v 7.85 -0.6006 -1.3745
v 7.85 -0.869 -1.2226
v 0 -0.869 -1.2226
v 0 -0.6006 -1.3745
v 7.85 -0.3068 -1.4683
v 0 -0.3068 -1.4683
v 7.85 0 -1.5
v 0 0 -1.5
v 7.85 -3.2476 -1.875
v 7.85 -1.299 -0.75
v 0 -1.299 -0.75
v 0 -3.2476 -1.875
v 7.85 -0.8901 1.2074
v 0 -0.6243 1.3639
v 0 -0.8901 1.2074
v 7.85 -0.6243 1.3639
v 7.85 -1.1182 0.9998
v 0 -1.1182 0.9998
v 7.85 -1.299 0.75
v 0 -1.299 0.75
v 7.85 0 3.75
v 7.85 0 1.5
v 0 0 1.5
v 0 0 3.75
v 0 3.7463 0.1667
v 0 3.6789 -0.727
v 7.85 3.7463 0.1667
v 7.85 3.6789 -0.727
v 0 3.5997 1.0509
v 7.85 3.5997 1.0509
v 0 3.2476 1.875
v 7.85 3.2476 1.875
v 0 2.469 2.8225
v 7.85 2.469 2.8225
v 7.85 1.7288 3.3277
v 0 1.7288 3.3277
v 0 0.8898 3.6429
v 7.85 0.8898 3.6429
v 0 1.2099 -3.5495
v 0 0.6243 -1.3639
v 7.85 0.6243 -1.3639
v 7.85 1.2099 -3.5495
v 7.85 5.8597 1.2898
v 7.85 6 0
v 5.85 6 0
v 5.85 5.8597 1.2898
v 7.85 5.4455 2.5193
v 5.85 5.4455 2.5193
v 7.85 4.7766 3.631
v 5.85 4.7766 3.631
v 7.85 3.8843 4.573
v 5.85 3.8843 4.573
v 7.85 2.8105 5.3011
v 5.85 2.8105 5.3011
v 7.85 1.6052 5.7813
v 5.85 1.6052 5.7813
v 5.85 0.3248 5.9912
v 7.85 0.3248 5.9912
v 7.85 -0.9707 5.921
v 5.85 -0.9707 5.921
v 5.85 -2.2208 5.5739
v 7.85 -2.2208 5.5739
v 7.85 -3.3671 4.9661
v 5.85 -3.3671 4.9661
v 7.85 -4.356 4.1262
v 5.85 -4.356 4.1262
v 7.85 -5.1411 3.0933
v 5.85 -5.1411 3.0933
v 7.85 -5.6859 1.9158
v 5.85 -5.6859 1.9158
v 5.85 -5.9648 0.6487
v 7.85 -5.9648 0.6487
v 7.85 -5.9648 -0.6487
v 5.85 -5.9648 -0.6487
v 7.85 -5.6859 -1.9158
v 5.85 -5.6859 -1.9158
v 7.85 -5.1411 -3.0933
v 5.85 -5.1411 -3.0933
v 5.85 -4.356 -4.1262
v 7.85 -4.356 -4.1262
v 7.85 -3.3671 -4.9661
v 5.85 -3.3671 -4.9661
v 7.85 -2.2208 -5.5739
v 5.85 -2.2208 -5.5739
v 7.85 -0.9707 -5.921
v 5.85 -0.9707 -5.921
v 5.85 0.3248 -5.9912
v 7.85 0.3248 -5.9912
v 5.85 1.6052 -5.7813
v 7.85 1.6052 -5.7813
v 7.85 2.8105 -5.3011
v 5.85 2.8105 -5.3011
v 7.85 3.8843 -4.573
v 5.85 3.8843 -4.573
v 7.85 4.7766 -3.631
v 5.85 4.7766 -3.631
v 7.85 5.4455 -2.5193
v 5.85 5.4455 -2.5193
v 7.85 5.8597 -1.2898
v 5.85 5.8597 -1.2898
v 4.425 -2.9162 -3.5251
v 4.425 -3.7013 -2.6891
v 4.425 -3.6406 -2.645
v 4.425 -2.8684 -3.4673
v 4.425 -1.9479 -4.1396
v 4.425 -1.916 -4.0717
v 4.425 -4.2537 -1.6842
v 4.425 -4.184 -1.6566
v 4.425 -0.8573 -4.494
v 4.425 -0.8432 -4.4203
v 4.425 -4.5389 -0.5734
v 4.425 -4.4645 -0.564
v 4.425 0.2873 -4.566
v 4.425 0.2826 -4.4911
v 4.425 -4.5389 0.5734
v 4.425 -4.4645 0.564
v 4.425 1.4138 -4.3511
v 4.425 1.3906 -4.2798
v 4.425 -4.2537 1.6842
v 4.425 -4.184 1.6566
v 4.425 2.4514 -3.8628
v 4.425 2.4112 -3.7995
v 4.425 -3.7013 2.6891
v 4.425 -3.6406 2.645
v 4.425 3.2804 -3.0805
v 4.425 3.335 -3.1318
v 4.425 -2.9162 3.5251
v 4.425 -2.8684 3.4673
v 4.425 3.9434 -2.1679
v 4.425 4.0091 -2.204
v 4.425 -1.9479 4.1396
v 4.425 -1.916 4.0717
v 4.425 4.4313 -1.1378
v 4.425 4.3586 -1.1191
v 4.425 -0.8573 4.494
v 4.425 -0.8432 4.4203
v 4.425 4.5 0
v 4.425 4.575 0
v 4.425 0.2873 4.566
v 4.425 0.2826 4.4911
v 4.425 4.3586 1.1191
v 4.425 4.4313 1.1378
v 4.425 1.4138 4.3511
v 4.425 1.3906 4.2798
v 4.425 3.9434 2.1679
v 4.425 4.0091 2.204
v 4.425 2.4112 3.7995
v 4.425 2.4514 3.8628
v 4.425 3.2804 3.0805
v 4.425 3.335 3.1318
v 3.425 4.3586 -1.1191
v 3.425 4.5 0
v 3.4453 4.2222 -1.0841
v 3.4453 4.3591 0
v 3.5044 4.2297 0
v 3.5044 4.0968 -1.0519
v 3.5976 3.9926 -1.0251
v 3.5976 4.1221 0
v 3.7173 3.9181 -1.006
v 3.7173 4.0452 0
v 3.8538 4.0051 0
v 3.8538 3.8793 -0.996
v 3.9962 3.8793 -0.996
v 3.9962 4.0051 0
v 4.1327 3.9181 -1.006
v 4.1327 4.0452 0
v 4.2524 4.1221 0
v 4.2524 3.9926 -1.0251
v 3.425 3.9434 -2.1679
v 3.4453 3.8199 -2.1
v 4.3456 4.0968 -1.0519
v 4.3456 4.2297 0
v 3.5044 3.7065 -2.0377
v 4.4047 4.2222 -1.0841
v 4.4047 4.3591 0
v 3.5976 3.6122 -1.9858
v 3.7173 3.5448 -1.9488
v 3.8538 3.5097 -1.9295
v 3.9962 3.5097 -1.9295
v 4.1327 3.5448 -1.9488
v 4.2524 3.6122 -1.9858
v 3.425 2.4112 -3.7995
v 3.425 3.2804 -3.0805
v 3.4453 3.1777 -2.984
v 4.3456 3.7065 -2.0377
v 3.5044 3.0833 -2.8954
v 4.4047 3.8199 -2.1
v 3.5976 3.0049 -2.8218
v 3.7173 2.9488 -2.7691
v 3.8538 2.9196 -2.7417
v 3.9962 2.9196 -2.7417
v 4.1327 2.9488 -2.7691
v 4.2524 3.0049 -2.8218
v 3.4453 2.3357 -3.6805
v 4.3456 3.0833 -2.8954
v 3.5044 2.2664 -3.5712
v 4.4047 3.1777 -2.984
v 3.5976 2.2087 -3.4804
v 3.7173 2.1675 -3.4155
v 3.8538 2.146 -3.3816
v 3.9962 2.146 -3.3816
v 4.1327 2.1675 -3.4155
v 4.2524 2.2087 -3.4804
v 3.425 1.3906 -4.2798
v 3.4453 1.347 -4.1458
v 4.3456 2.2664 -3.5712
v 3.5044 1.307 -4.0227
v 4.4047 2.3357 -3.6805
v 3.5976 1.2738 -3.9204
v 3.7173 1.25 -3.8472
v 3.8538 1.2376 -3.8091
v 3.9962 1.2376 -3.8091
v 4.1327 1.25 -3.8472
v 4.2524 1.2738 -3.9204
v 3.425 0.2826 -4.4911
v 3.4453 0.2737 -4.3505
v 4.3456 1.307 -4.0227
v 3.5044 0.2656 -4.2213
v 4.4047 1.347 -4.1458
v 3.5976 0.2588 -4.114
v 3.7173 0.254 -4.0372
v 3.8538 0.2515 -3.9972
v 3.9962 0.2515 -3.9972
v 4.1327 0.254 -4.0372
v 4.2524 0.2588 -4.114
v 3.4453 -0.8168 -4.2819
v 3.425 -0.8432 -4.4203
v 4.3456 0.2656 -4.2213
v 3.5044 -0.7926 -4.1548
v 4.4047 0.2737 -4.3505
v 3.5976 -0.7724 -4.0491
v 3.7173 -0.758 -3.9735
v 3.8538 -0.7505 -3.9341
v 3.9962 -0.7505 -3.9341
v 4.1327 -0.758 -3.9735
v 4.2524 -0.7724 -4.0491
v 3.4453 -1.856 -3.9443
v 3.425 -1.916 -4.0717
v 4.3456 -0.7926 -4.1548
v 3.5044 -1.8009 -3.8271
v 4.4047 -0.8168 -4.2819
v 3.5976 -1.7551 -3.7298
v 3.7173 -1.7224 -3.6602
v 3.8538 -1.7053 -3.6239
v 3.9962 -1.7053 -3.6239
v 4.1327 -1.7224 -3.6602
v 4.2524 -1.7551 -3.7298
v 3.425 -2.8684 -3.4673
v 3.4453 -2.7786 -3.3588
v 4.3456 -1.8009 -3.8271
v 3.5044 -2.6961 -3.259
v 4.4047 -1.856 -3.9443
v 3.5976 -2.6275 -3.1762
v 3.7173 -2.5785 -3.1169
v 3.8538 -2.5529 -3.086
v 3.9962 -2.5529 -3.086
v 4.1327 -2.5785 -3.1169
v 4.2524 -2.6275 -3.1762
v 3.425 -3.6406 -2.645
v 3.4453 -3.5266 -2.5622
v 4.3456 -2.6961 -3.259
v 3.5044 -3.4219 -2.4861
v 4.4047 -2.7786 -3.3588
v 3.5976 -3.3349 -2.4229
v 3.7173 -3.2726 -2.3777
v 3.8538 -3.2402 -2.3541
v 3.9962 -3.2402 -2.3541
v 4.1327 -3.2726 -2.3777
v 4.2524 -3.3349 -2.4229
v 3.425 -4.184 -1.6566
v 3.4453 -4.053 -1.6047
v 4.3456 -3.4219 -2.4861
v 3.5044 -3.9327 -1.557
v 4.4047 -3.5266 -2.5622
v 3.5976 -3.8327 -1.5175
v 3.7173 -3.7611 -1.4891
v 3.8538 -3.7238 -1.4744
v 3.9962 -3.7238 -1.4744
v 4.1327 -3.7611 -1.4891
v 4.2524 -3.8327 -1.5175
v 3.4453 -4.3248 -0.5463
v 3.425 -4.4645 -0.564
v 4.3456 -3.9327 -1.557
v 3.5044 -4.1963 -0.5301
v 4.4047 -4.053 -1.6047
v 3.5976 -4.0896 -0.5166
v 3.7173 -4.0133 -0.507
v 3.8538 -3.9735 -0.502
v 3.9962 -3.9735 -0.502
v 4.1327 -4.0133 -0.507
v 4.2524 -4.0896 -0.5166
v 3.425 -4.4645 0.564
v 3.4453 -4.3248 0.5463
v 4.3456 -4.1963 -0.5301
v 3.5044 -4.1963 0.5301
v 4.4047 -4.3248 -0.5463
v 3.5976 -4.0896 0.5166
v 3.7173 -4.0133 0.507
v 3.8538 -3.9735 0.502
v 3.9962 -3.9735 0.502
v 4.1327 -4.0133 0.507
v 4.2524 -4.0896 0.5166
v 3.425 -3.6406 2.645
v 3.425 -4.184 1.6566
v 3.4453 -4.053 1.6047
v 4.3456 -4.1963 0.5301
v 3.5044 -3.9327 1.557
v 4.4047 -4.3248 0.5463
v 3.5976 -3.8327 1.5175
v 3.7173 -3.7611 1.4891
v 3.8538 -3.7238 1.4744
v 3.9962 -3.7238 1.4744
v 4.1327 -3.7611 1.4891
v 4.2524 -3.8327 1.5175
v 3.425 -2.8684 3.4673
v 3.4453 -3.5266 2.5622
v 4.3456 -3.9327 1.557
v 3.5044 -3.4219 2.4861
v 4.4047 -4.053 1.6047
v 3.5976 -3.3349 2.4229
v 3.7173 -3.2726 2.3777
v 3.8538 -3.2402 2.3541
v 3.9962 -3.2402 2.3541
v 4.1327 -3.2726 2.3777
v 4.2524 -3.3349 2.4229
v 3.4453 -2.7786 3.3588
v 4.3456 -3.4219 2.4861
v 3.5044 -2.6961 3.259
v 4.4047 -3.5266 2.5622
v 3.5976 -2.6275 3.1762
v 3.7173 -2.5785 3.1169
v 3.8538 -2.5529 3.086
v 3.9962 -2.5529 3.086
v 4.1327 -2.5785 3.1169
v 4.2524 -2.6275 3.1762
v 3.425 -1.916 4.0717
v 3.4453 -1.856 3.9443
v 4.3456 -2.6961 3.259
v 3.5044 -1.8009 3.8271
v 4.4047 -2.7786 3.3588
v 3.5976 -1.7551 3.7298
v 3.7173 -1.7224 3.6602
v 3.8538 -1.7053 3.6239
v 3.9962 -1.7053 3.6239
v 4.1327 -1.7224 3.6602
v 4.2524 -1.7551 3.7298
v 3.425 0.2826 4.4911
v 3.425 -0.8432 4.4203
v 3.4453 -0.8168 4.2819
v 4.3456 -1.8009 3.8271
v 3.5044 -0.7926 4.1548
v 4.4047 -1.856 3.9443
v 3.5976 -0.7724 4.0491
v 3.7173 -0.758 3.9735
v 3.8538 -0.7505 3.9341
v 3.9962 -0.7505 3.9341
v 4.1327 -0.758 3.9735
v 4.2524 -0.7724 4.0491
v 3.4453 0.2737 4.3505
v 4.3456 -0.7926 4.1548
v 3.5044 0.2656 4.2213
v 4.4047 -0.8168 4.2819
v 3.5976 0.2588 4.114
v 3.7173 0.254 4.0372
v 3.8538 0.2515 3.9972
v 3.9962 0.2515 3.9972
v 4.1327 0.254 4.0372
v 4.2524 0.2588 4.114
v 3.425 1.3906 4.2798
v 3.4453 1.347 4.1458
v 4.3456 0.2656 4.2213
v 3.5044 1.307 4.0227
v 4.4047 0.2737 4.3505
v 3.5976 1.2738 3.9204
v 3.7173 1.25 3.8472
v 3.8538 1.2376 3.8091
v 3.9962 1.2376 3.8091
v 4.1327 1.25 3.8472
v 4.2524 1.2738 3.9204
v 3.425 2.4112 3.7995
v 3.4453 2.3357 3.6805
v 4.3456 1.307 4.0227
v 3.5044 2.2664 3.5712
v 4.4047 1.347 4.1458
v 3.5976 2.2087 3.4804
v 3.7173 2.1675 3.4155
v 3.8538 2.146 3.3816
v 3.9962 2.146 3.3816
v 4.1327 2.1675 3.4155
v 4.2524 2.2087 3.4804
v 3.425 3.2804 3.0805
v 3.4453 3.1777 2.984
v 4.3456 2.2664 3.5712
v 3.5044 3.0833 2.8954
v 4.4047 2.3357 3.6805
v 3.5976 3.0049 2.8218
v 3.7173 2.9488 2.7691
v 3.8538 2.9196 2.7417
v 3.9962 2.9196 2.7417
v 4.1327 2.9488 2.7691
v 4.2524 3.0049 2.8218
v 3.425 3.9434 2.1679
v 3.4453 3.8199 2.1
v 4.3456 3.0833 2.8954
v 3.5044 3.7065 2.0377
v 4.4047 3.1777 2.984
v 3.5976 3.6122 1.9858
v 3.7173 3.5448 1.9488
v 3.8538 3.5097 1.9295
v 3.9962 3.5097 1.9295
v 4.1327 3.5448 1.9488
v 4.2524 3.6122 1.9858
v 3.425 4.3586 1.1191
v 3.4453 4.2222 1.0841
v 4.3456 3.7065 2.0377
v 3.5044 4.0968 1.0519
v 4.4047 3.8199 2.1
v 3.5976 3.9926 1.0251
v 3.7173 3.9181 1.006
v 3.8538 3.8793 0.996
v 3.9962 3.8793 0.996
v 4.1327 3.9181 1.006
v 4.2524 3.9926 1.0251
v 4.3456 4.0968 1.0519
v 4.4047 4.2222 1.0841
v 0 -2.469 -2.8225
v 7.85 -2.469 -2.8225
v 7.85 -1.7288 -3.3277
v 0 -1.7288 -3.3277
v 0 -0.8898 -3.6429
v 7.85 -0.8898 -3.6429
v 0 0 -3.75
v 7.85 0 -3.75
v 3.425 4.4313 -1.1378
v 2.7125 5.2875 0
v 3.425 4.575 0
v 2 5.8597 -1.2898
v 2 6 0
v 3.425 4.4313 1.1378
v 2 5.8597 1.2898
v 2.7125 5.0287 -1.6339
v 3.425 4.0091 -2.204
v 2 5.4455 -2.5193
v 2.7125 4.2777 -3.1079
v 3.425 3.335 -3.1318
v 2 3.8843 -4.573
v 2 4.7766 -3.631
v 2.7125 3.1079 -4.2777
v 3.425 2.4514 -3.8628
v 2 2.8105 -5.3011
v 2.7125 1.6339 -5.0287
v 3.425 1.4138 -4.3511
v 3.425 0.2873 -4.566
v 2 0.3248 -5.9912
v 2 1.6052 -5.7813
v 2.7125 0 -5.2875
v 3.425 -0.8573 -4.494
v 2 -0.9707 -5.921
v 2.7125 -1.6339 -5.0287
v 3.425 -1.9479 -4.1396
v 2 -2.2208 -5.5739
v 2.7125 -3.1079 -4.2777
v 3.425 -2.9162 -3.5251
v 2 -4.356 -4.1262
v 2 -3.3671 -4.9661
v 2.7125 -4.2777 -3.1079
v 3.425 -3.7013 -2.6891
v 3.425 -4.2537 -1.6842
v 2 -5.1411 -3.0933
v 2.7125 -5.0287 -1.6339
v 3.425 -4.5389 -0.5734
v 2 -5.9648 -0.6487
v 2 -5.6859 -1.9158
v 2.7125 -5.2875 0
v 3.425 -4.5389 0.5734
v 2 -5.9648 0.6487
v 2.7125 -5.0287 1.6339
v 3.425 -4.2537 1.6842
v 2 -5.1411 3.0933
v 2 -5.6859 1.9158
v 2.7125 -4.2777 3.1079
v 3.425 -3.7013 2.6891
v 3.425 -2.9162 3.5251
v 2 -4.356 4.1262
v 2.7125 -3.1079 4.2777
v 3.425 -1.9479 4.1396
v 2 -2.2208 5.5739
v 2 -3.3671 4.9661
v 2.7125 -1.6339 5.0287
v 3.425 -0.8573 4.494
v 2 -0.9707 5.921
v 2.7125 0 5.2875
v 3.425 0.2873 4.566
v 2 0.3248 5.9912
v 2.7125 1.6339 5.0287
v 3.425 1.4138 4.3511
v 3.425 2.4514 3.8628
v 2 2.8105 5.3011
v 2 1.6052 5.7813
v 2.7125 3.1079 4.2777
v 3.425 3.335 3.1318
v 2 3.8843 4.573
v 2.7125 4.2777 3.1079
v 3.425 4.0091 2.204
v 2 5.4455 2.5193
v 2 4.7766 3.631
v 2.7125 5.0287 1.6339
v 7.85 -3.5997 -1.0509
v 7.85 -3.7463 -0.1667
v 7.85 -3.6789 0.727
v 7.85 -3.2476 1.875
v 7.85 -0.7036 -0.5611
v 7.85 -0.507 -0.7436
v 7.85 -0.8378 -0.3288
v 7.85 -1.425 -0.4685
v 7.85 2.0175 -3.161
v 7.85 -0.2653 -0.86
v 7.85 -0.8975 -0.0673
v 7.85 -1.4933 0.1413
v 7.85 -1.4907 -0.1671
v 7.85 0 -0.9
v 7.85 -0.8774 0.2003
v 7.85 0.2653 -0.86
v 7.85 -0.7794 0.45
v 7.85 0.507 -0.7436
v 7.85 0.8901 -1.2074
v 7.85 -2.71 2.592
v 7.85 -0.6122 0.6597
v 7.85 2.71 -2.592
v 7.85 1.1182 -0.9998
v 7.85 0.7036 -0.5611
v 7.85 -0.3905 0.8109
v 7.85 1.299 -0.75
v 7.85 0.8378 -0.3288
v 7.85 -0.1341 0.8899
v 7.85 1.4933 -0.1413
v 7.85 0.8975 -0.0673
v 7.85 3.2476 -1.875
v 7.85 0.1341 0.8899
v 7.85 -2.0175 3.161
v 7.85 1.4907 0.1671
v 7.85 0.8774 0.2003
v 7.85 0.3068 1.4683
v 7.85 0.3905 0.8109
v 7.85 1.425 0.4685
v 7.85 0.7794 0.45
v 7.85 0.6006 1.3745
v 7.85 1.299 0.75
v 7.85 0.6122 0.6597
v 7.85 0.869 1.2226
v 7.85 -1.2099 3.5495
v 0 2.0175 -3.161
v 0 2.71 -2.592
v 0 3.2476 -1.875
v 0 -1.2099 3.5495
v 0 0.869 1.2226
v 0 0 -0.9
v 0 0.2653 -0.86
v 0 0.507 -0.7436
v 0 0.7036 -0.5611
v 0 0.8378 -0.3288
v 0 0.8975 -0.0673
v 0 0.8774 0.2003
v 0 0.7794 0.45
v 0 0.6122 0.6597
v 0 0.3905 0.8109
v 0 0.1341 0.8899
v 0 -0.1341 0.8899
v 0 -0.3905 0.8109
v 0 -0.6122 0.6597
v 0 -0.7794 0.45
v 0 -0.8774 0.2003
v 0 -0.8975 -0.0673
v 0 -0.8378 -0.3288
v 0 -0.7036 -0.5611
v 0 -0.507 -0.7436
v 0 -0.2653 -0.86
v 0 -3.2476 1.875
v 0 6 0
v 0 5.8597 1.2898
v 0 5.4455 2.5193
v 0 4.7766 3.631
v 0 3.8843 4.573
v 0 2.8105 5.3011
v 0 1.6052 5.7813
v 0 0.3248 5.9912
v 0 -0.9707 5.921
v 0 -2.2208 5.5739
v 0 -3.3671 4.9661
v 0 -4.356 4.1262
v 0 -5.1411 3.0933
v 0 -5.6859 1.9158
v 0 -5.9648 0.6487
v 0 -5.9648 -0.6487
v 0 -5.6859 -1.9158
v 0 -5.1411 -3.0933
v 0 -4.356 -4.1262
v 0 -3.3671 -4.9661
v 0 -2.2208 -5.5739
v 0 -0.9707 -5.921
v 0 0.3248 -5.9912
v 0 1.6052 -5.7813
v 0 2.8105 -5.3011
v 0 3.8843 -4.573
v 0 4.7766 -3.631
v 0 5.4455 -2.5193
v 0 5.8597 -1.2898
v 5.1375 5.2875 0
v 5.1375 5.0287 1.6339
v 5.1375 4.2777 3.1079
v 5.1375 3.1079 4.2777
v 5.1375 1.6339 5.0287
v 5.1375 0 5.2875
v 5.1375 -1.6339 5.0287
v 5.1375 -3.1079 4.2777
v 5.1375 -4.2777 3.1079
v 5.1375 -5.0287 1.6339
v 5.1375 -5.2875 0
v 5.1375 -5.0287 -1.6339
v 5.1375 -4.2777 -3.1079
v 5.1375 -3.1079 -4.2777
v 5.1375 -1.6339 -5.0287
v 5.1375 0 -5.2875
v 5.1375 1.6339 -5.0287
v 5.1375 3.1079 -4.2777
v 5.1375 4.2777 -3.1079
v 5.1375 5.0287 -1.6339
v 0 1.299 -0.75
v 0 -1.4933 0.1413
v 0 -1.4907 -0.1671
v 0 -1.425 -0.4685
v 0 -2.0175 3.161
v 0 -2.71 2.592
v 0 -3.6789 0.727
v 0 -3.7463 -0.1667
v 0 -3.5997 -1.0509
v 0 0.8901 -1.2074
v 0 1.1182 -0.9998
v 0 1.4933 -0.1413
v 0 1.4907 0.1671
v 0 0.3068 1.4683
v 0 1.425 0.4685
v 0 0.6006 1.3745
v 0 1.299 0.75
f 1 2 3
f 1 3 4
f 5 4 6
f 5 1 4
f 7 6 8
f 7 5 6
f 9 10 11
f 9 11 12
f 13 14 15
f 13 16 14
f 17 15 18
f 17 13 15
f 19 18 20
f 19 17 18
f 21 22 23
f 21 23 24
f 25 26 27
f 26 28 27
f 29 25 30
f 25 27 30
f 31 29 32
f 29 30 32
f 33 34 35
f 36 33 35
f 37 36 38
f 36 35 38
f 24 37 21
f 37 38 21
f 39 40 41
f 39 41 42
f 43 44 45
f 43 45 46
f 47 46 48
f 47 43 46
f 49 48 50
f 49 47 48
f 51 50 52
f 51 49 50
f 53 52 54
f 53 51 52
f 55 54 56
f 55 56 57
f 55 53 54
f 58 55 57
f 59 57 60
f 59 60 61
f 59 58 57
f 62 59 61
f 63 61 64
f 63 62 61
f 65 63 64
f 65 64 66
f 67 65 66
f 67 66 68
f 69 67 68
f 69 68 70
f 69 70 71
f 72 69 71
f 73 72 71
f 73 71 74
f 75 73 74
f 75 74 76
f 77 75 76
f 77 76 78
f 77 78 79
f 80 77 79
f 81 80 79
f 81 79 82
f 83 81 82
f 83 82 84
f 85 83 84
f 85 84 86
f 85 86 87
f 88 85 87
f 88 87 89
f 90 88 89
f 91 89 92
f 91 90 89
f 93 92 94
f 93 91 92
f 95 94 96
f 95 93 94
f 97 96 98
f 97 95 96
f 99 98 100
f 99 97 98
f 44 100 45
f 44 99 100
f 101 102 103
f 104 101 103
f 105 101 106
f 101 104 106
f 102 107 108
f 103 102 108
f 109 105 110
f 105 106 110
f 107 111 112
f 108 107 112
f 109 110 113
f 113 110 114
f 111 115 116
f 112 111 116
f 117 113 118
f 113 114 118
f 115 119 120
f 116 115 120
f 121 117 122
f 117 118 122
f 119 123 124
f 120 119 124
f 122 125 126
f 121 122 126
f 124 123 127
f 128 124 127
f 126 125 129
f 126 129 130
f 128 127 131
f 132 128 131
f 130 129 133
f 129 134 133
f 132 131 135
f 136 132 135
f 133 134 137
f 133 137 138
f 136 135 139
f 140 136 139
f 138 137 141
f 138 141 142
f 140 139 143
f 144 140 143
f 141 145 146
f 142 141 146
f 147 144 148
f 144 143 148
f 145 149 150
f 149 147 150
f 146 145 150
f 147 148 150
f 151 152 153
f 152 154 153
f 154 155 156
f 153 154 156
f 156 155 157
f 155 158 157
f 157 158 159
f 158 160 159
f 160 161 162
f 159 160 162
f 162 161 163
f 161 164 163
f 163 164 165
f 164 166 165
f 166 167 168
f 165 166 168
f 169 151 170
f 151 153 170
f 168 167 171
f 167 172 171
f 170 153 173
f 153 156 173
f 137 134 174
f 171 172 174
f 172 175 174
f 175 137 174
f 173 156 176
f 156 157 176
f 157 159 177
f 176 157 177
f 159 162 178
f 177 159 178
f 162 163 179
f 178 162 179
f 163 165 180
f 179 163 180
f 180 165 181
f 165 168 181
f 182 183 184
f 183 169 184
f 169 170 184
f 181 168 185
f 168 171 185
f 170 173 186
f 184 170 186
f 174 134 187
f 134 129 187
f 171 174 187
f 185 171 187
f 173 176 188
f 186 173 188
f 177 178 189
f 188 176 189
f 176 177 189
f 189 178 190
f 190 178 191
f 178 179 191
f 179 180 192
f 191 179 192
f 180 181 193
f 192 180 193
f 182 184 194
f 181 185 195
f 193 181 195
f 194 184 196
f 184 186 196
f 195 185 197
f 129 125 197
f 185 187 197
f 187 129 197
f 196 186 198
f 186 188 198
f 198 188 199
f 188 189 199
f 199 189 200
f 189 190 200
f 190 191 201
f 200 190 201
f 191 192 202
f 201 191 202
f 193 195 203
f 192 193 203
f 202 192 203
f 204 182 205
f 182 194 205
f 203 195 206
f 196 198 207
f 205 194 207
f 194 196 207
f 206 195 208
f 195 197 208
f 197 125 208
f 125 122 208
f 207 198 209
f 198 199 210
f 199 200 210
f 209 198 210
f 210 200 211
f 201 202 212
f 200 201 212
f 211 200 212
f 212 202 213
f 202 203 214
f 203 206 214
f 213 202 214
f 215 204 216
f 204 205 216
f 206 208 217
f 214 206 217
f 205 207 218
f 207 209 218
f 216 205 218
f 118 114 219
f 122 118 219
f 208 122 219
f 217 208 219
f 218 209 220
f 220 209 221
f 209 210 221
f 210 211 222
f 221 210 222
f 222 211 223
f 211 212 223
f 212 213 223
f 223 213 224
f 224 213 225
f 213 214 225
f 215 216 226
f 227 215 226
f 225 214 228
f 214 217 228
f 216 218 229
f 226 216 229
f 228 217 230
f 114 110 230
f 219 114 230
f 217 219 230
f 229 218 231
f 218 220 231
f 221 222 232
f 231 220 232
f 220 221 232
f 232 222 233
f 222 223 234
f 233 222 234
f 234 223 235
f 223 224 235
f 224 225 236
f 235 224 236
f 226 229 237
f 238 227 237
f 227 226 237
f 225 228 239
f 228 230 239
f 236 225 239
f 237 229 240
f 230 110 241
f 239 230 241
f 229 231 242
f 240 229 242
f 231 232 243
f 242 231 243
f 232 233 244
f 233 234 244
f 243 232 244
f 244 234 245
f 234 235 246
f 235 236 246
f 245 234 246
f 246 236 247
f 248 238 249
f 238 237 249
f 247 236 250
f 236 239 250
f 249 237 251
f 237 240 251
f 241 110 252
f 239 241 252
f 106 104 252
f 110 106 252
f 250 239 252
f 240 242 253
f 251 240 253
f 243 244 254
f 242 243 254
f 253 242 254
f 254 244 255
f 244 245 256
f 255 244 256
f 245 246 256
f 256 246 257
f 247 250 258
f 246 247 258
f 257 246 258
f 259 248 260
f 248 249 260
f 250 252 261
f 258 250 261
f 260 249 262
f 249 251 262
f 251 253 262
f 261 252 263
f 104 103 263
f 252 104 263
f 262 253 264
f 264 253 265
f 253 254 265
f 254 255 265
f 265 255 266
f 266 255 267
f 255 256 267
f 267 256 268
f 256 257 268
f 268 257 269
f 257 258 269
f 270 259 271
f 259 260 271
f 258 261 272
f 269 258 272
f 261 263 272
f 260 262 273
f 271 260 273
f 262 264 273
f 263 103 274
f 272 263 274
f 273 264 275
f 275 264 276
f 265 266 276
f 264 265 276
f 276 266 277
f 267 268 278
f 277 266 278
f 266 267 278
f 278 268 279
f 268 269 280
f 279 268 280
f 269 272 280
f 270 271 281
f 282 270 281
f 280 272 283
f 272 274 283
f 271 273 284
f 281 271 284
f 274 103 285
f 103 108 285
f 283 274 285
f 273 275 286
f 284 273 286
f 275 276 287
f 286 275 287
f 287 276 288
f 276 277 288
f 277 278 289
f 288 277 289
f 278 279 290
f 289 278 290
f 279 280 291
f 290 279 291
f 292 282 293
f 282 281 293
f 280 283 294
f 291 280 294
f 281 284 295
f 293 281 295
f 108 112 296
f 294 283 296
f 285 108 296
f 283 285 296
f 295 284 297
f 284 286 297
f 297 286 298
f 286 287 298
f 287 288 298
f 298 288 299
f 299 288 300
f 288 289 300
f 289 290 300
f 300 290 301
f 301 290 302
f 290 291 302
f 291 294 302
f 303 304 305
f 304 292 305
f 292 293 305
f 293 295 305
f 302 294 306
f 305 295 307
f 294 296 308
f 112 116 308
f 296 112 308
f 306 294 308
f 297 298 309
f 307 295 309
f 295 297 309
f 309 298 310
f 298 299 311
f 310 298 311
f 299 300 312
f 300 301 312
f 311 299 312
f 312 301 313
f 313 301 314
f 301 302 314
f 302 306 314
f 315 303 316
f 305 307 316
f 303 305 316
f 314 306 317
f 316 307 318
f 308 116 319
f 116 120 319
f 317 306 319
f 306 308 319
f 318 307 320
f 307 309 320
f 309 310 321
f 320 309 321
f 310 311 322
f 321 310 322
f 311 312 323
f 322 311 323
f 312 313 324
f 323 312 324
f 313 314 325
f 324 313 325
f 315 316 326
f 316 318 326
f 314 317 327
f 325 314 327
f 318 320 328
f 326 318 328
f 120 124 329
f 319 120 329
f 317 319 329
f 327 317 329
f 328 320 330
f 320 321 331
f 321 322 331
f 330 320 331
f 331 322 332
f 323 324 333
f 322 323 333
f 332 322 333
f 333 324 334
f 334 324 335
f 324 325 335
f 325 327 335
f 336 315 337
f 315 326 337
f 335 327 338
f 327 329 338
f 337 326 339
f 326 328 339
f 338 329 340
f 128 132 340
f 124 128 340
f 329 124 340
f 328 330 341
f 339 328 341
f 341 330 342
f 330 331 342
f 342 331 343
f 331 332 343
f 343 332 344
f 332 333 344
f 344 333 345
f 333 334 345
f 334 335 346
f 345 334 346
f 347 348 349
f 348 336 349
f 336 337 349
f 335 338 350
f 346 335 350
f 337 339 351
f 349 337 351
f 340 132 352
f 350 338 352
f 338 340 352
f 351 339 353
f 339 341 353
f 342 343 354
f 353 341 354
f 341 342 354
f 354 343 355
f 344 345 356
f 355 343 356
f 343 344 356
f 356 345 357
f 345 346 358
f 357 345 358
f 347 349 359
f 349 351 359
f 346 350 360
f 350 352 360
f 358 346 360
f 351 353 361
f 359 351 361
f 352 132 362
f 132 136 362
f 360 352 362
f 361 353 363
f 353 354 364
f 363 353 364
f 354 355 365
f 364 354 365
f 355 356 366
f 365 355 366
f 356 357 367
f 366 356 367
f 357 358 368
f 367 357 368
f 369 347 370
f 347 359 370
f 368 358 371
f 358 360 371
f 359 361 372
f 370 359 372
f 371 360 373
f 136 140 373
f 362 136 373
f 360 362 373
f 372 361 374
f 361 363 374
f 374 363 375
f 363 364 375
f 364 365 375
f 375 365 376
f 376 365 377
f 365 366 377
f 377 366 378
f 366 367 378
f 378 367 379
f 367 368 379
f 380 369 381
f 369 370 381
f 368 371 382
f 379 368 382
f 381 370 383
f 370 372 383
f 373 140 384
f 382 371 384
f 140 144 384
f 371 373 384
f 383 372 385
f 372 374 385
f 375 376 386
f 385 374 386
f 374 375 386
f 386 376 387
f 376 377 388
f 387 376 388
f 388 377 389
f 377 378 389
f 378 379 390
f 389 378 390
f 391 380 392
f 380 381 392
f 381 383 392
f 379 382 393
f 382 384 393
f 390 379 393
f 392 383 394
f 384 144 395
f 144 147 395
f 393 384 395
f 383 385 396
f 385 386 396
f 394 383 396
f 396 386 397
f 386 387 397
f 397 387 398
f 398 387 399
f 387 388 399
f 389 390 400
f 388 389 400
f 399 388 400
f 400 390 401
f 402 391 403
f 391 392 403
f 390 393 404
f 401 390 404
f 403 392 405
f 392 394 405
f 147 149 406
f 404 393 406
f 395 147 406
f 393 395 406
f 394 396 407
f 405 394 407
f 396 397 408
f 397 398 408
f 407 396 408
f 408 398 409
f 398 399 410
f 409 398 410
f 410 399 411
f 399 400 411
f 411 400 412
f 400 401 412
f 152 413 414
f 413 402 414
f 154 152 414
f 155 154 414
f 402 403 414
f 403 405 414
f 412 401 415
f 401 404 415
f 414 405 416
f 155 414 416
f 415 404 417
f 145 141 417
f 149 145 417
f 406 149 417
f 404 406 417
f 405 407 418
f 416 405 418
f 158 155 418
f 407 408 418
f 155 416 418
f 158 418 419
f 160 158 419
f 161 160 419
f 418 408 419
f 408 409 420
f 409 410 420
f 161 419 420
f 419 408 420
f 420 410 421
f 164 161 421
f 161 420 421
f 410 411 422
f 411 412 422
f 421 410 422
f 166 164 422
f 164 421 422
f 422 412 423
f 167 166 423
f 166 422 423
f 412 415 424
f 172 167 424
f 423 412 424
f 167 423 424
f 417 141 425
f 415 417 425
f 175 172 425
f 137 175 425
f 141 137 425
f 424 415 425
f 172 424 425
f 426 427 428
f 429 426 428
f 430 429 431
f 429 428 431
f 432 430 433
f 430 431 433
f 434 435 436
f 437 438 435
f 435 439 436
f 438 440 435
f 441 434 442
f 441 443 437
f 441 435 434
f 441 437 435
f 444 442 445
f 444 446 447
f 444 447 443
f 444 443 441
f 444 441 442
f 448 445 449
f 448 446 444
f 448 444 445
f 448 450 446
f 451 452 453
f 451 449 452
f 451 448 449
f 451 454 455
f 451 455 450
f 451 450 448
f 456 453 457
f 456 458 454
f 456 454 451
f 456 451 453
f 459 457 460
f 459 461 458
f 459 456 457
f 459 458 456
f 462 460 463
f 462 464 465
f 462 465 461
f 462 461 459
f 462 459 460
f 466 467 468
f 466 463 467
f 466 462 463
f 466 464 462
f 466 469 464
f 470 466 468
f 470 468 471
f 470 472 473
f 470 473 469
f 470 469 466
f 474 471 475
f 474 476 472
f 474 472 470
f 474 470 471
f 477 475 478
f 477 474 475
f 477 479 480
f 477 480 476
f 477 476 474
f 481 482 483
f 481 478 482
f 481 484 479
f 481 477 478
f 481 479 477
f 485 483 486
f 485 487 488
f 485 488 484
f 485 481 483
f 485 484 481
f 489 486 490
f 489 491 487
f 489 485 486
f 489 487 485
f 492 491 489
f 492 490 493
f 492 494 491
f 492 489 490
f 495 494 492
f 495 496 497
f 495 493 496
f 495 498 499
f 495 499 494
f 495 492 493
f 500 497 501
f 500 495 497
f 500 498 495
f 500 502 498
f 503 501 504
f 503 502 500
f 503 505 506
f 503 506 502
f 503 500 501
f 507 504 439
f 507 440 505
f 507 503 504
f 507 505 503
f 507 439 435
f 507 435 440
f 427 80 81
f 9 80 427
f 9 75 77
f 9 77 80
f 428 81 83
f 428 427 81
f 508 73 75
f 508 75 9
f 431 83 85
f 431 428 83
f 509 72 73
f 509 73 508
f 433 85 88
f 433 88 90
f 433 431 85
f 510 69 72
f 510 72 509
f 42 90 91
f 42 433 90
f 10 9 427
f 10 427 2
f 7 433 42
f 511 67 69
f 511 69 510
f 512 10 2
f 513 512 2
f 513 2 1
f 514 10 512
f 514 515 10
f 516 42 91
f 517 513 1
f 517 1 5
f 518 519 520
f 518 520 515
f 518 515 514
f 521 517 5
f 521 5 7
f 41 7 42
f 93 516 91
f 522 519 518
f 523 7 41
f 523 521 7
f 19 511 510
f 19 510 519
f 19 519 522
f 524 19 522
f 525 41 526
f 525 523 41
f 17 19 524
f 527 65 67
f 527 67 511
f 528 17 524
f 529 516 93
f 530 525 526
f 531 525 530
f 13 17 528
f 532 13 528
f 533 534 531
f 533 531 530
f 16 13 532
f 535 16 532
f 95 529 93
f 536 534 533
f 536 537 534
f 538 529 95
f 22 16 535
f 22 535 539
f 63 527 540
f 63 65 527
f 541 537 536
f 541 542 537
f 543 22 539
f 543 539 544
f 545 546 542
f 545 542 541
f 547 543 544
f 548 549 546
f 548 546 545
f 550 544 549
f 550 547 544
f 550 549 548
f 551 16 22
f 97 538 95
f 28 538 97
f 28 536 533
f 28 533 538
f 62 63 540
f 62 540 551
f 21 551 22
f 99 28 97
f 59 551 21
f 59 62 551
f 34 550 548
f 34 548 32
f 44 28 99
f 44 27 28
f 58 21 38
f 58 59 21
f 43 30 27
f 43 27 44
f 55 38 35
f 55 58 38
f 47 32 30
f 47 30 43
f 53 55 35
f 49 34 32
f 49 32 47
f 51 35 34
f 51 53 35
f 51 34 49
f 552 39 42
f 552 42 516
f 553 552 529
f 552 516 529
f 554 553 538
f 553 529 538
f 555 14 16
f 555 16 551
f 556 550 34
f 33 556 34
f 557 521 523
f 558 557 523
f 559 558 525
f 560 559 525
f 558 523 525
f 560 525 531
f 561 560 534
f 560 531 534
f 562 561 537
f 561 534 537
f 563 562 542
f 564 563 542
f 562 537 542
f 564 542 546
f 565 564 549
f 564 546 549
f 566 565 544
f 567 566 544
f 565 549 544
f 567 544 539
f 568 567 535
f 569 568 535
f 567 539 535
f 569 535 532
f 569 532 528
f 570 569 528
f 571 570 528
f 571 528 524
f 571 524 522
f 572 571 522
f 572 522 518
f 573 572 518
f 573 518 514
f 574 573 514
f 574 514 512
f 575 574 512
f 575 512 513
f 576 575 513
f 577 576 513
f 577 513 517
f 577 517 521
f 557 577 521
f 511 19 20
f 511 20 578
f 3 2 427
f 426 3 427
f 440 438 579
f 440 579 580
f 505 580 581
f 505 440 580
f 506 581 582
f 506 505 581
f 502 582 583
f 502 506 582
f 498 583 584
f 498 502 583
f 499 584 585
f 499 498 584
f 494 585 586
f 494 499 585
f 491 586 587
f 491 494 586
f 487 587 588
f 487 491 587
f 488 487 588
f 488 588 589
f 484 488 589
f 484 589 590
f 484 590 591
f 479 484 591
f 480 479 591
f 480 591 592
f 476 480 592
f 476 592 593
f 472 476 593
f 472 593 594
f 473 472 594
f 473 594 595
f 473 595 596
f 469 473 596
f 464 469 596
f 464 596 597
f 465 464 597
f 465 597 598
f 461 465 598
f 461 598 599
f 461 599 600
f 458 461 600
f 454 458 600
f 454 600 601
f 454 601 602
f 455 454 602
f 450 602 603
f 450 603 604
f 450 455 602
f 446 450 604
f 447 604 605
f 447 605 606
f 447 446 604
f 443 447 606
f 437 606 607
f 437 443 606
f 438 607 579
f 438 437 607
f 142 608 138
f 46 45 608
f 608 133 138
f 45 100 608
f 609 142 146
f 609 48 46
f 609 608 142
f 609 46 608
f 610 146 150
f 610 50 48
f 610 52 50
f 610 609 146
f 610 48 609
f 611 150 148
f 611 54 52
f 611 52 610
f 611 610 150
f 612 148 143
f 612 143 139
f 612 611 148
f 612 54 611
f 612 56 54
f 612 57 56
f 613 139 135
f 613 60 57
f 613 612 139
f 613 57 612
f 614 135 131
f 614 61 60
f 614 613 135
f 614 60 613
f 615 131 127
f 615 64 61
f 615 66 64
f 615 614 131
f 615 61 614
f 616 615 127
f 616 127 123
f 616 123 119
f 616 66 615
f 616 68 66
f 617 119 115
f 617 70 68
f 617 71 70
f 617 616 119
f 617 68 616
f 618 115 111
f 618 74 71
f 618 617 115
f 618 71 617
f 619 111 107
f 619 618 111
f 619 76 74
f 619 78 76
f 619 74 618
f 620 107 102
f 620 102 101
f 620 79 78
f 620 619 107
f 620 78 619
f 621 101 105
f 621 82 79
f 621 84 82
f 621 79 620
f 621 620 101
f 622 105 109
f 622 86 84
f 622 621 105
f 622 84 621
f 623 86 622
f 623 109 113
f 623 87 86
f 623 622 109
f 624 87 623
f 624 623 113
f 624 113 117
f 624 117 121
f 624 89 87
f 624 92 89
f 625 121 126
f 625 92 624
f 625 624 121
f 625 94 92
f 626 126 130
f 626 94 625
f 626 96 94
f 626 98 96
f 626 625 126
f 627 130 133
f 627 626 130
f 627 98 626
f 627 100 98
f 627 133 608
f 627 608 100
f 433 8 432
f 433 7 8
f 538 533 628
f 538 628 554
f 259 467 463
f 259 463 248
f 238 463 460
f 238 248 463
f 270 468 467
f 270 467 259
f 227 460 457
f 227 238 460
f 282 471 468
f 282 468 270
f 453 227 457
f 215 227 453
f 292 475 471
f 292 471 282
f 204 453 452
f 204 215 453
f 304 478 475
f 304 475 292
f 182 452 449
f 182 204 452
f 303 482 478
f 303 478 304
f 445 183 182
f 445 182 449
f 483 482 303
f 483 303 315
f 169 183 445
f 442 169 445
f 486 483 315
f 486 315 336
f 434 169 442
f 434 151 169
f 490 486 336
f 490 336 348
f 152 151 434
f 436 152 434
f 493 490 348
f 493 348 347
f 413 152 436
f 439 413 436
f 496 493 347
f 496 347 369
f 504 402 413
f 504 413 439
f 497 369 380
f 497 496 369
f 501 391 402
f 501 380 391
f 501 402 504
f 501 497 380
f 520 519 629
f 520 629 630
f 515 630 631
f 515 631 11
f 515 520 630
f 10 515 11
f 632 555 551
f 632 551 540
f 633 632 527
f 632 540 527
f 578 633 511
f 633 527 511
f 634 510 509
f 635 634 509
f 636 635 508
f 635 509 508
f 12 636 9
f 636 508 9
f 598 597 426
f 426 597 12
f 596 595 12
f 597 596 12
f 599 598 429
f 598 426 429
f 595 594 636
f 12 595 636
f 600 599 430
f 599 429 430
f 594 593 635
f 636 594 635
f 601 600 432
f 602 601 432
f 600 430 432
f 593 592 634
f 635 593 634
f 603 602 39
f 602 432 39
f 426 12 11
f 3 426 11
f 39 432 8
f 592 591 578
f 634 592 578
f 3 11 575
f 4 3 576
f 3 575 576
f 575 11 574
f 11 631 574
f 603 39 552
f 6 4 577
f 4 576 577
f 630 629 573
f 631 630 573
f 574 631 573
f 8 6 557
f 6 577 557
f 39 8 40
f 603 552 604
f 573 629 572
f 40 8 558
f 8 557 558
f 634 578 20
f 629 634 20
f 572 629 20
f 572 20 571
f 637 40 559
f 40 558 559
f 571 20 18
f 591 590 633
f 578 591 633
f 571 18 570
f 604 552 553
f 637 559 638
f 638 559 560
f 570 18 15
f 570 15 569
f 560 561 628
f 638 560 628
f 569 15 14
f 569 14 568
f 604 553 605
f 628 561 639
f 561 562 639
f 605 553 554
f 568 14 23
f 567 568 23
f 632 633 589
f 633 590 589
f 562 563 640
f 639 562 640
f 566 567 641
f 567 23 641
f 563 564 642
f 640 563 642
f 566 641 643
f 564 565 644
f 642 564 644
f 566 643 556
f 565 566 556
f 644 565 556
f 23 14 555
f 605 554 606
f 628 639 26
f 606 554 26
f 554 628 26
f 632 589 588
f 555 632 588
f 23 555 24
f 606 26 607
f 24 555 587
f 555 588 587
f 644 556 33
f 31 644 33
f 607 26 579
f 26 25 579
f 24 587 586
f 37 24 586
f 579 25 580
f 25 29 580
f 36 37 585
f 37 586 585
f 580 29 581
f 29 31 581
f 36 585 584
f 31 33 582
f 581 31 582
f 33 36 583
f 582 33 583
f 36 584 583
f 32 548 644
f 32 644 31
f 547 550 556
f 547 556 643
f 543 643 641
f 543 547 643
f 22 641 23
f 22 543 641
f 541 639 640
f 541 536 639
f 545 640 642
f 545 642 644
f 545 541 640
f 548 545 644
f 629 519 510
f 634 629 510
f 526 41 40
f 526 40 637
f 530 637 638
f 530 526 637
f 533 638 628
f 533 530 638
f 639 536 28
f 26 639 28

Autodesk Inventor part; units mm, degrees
ref_plane "YZ Plane" through (0, 0, 0) normal (1, 0, 0) x (0, 1, 0)
ref_plane "XZ Plane" through (0, 0, 0) normal (0, 1, 0) x (-1, 0, 0)
ref_plane "XY Plane" through (0, 0, 0) normal (0, 0, 1) x (1, 0, 0)
sketch "Skizze1" plane through (0, 0, 0) normal (0, 0, 1) x (1, 0, 0)
  line L0 (0, 0) -> (7.85, 0)
  line L1 (3.925, 0) -> (3.925, 15.4029) construction
  line L2 (0, 0) -> (0, 6)
  line L3 (0, 6) -> (2, 6)
  line L4 (2, 6) -> (3.425, 4.575)
  line L5 (3.425, 4.575) -> (3.425, 4.5)
  arc A0 (3.425, 4.5) -> (4.425, 4.5) centre (3.925, 4.5) ccw
  line L6 (4.425, 4.5) -> (4.425, 4.575)
  line L7 (4.425, 4.575) -> (5.85, 6)
  line L8 (5.85, 6) -> (7.85, 6)
  line L9 (7.85, 6) -> (7.85, 0)
  dimension "d0" = 2
  dimension "d1" = 45
  dimension "d2" = 0.5
  dimension "d3" = 12
  dimension "d4" = 9
  dimension "d5" = 7.85
revolve "Umdrehung1" add sketch "Skizze1" angle 360 about axis through (0, 0, 0) along (1, 0, 0)
sketch "Skizze2" plane through (7.85, 0, 0) normal (1, 0, 0) x (0, 0, -1)
  circle A0 centre (0, 0) radius 6 projected
  circle A1 centre (0, 0) radius 1.5
  line L0 (-0.869, 1.2226) -> (-2.469, 2.8225)
  line L1 (-1.2226, 0.869) -> (-2.8225, 2.469)
  line L2 (8.4, 0) -> (-8.4, 0) projected
  line L3 (0, 0) -> (-2.6517, 2.6517) construction
  circle A2 centre (0, 0) radius 3.75
  line L4 (-1.5, 0) -> (-3.75, 0)
  dimension "d7" = 3
  dimension "d8" = 45
  dimension "d9" = 0.5
  dimension "d10" = 7.5
extrude "Extrusion2" cut sketch "Skizze2" against normal through all contours A2 L1 A1 L2
pattern_circular "Runde Anordnung2" count 6 over 360 about axis through (6.85, 0, 0) along (1, 0, 0) of "Extrusion2"
sketch "Skizze3" plane through (7.85, 0, 0) normal (1, 0, 0) x (0, 0, -1)
  circle A0 centre (0, 0) radius 0.9
  dimension "d21" = 1.8
extrude "Extrusion3" cut sketch "Skizze3" against normal up to surface (7.85 mm away)
properties part number "Rad" material "Stahl, galvanisiert"
